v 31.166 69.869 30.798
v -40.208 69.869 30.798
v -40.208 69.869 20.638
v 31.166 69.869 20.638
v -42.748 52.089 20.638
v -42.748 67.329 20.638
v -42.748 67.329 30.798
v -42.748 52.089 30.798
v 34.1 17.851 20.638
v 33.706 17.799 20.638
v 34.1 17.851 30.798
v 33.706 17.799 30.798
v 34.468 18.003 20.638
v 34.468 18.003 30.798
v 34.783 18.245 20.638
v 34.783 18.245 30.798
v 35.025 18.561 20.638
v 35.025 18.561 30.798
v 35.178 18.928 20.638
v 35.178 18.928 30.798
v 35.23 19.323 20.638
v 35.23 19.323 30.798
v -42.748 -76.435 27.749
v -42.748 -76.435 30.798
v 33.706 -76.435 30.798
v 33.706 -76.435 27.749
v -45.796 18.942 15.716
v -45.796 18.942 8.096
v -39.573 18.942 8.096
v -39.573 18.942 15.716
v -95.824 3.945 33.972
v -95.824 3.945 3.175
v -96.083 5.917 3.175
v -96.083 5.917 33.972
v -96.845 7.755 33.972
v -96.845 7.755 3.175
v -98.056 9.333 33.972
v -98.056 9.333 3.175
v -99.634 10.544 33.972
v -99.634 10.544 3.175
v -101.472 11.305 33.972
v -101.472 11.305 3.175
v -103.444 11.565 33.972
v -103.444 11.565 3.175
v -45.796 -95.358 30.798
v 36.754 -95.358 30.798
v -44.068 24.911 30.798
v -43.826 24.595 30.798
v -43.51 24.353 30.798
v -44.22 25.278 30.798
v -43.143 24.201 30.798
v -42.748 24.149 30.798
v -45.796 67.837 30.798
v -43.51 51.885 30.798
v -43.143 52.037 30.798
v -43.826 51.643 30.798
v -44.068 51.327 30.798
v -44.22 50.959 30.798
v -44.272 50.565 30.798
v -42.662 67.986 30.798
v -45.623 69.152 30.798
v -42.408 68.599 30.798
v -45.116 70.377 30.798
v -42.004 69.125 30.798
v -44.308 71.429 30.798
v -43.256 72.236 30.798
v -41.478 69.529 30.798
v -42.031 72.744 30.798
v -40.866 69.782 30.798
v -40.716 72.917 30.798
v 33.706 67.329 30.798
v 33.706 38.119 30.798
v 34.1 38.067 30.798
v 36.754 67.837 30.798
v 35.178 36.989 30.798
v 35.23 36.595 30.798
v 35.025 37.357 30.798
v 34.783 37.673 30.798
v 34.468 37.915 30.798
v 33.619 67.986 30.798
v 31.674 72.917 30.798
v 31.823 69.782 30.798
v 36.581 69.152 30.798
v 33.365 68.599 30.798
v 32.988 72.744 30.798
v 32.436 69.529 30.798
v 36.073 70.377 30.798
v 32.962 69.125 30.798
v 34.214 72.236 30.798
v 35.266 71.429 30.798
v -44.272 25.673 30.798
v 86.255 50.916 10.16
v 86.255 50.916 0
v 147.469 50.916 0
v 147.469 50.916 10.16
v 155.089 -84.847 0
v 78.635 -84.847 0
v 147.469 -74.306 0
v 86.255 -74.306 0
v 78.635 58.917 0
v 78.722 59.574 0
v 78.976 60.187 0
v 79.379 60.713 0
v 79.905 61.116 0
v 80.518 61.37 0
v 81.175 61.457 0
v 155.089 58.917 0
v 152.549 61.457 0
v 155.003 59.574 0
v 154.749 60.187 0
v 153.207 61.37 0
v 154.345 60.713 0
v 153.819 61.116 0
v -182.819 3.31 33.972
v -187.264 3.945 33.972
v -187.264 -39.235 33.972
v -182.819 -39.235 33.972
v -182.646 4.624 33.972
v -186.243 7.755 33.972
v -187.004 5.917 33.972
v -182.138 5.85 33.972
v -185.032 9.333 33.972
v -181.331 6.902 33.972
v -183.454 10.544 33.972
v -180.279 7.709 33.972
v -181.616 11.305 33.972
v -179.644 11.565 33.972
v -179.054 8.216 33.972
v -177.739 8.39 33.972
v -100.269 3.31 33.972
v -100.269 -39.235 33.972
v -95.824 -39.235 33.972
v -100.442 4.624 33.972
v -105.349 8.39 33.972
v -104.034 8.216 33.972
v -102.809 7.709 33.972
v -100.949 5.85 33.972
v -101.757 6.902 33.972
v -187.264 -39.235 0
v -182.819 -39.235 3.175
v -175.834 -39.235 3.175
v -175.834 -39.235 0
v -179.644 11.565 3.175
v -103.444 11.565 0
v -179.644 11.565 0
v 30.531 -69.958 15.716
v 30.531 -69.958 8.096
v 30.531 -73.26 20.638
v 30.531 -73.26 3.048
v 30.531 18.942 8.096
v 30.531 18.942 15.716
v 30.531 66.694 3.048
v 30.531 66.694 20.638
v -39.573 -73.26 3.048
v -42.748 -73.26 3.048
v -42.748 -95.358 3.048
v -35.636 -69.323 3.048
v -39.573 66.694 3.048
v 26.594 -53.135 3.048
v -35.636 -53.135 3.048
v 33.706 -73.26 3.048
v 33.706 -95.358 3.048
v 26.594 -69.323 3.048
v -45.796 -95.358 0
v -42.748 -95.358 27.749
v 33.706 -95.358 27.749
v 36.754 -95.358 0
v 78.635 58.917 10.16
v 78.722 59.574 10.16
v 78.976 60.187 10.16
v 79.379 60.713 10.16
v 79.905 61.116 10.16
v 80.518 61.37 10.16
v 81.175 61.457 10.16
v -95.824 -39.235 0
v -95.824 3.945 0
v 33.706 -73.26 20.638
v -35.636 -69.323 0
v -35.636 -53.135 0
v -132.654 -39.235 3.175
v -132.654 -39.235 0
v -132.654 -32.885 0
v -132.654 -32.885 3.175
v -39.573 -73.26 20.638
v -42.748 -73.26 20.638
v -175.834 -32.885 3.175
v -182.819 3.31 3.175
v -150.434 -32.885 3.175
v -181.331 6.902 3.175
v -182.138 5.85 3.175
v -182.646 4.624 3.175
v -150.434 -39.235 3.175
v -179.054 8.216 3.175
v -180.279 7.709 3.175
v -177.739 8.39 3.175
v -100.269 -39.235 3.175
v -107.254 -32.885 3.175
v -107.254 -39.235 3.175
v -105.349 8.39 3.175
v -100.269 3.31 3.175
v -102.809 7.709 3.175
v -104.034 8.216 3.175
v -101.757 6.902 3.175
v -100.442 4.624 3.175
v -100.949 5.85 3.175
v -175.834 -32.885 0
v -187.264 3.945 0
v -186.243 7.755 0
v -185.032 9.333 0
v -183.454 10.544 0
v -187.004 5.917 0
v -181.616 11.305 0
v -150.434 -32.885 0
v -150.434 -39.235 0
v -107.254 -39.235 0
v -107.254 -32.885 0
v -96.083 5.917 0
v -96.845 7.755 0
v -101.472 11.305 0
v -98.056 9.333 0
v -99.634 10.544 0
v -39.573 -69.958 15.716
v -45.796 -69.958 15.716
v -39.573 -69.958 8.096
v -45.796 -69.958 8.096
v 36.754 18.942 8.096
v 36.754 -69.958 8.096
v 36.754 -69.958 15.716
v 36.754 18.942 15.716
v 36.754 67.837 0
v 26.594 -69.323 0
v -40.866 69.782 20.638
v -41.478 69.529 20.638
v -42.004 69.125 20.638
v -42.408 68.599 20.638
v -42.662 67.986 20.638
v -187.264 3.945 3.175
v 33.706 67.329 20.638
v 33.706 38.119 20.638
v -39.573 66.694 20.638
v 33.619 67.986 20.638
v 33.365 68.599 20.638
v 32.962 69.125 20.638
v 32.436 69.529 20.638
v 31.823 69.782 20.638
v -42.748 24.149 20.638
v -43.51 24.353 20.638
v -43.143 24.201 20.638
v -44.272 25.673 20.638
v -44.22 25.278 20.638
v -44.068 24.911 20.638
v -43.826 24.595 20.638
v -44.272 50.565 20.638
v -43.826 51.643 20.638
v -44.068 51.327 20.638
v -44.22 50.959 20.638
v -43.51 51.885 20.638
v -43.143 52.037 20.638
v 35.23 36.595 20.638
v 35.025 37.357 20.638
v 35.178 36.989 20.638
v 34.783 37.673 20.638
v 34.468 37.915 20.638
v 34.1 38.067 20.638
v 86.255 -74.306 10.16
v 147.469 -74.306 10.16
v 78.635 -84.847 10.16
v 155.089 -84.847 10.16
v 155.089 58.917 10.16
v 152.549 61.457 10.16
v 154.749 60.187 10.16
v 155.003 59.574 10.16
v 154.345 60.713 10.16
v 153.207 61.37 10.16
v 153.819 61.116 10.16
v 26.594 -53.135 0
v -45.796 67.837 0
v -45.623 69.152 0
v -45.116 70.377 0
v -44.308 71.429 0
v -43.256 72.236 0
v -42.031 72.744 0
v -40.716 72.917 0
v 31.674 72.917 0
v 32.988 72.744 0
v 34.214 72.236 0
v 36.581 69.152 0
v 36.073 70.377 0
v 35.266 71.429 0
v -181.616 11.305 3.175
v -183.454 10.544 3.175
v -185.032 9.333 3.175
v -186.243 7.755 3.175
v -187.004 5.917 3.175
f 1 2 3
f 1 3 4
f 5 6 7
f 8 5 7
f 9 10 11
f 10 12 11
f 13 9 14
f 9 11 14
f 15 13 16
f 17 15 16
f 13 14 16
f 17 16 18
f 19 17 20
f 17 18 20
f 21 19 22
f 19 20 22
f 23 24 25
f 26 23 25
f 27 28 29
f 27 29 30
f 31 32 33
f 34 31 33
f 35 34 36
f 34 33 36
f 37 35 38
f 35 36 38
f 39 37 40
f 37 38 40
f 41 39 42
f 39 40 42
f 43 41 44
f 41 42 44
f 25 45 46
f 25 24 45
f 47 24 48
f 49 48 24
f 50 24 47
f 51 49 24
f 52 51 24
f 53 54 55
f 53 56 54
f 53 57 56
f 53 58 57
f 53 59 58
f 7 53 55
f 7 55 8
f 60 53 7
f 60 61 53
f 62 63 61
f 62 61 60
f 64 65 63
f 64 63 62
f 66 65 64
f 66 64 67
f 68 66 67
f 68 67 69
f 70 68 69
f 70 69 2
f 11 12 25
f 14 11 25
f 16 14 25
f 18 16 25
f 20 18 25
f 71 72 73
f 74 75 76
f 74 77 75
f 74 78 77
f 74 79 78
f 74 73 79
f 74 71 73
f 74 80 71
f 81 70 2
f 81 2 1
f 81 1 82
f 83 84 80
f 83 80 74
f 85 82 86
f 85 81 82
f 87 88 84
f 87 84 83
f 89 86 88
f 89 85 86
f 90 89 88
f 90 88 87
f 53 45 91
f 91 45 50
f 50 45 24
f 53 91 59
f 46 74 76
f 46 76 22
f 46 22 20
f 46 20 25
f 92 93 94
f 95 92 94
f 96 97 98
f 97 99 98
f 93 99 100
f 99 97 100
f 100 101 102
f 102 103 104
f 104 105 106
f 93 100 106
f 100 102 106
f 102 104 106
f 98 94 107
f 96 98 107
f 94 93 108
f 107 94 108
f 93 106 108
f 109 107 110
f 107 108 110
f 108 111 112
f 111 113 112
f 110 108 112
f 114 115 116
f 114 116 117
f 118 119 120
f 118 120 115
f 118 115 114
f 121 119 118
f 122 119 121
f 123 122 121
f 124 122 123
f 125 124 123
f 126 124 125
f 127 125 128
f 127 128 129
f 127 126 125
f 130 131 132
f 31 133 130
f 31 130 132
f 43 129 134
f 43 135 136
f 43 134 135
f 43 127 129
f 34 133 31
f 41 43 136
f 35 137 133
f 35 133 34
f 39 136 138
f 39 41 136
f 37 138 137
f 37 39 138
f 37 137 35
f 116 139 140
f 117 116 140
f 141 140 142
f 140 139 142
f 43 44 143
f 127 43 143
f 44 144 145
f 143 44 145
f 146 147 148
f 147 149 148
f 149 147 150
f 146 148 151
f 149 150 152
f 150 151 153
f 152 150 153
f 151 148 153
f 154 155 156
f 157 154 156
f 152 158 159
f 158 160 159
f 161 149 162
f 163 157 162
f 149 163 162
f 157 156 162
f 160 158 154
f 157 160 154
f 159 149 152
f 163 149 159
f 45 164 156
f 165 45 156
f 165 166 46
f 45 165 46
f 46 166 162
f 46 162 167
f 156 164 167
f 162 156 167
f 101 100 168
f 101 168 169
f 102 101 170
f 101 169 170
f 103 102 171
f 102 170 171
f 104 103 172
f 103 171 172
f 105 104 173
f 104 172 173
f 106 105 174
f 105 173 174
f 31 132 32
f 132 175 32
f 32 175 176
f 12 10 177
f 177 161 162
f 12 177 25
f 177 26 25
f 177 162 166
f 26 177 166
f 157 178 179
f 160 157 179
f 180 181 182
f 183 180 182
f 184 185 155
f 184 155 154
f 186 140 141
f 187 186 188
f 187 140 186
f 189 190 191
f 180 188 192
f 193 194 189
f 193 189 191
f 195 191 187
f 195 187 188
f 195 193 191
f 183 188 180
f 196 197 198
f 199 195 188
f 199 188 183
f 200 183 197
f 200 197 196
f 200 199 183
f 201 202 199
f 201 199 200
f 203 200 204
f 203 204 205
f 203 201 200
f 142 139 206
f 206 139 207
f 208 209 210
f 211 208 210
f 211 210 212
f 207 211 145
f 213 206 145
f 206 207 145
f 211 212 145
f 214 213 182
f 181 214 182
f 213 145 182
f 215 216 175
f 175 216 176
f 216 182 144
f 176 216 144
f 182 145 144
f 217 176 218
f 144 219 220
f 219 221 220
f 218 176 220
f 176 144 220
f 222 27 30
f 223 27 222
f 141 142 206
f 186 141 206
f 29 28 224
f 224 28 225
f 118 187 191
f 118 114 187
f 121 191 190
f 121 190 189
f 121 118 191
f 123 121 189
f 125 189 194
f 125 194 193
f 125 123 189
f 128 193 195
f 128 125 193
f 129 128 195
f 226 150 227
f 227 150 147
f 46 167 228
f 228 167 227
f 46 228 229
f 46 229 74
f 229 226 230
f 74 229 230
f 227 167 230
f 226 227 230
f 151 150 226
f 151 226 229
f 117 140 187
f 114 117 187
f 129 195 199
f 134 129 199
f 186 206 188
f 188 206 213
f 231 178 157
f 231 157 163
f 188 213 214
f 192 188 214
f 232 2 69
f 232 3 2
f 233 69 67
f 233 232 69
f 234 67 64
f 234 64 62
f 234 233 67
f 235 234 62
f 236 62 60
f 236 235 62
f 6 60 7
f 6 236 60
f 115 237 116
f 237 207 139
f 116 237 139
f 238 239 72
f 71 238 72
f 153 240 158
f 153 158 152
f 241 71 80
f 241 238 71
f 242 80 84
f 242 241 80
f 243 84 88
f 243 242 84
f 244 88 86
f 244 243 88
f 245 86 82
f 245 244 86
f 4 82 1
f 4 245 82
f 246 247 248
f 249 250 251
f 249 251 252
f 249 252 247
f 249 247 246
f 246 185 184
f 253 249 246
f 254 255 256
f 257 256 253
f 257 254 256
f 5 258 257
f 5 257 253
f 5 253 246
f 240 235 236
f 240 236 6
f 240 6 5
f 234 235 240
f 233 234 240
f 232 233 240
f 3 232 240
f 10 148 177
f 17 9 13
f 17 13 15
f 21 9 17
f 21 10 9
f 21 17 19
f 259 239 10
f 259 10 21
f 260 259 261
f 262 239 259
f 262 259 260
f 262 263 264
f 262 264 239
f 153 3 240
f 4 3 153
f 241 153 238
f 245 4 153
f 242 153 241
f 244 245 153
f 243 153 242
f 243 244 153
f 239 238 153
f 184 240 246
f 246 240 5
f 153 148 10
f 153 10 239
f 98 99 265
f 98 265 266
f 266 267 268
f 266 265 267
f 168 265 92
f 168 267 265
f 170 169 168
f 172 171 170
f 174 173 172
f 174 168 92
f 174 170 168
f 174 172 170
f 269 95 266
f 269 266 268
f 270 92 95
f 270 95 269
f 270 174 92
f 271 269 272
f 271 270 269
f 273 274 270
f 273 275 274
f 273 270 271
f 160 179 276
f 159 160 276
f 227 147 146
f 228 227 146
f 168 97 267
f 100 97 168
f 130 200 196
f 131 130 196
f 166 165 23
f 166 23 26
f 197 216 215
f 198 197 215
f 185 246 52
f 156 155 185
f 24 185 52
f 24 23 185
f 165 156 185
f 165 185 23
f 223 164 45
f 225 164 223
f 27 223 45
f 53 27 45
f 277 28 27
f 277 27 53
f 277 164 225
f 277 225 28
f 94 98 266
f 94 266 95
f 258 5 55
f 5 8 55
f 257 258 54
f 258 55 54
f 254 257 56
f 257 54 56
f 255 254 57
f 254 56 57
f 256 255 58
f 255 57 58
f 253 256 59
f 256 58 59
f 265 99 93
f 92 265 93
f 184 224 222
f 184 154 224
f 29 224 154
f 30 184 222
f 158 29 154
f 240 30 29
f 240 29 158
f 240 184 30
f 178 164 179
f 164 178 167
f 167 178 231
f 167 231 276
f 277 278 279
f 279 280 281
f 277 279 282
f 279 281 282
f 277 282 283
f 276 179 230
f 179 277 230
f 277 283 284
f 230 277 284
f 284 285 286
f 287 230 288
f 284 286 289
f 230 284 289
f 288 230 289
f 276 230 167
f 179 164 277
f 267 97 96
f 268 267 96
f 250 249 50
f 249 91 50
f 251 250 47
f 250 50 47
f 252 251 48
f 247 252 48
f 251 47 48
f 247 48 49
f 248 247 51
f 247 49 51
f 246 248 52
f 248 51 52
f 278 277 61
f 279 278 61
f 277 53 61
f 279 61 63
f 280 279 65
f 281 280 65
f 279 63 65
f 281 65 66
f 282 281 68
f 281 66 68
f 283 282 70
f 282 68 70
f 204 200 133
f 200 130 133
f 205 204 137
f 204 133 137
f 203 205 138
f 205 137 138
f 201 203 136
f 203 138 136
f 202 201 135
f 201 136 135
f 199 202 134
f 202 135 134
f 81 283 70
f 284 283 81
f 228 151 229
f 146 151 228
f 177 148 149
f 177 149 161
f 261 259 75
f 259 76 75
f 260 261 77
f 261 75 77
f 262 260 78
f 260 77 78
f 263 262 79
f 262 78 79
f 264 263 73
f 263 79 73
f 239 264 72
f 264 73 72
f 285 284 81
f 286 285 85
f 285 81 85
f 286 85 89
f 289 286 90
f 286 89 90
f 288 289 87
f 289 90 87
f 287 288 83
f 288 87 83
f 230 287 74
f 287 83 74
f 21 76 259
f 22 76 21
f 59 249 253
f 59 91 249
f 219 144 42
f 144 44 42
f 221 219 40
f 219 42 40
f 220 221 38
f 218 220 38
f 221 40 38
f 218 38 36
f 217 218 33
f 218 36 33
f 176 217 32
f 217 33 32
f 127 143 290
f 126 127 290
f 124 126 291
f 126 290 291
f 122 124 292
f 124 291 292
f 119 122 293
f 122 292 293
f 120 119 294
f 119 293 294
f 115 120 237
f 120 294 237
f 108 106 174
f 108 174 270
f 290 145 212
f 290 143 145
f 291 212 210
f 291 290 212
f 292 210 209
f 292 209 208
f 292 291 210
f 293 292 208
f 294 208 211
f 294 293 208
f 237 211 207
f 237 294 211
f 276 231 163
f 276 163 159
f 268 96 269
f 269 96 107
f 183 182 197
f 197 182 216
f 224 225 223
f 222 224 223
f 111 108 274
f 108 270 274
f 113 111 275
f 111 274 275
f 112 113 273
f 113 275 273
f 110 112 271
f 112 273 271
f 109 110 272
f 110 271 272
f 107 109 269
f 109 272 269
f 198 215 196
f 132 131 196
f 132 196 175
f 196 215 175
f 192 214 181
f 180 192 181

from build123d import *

# Parameters (mm, degrees)
F0_W      = 82.55
F0_H      = 152.4
F0_W_2    = 62.23
F0_H_2    = 16.1877755683
F1_DEPTH  = 30.7975
F2_W      = 76.454
F2_H      = 146.304
F2_W_2    = 62.23
F2_H_2    = 16.1877755683
F3_DEPTH  = 10.16
F4_W      = 70.104
F4_H      = 139.954
F4_W_2    = 62.23
F4_H_2    = 16.1877755683
F5_DEPTH  = 17.5895
F0_H_3    = 15.875
F6_DEPTH  = 30.7975
F7_W      = 76.454
F7_H      = 24.7015
F8_DEPTH  = 22.098
F9_W      = 88.9
F9_H      = 7.62
F10_DEPTH = 82.55
F11_R     = 5.08
F12_W     = 27.94
F12_H     = 10.16
F13_DEPTH = 1.524
F14_R     = 1.52399
F15_W     = 20.32
F15_H     = 10.16
F16_DEPTH = 1.524
F17_R     = 1.52399
F18_R     = 2.54
F20_DEPTH = 3.175
F21_R     = 7.62
F23_DEPTH = 30.7975
F24_R     = 5.08
F25_W     = 76.454
F25_H     = 146.304
F25_W_2   = 61.214
F25_H_2   = 125.222
F26_DEPTH = 10.16
F27_R     = 2.54


# Not quite as in the source:
# - a fillet or chamfer is up to 0.001 mm smaller than in the source, because OpenCascade refuses the exact size


with BuildPart() as f1:
    # F0 (on Top) → F1 (new body)
    with BuildSketch(Plane.XY):
        with Locations((-4.5213731422, -3.2830588596)):
            Rectangle(F0_W, F0_H)
        with Locations((-4.5213731422, -61.2291710755)):
            Rectangle(F0_W_2, F0_H_2, mode=Mode.SUBTRACT)
    extrude(amount=F1_DEPTH)

    # F2 (on face) → F3 (cut)
    with BuildSketch(Plane.XY.offset(30.7975)):
        with Locations((-4.5213731422, -3.2830588596)):
            Rectangle(F2_W, F2_H)
        with Locations((-4.5213731422, -61.2291710755)):
            Rectangle(F2_W_2, F2_H_2, mode=Mode.SUBTRACT)
    extrude(amount=-F3_DEPTH, mode=Mode.SUBTRACT)

    # F4 (on face) → F5 (cut)
    with BuildSketch(Plane.XY.offset(20.6375)):
        with Locations((-4.5213731422, -3.2830588596)):
            Rectangle(F4_W, F4_H)
        with Locations((-4.5213731422, -61.2291710755)):
            Rectangle(F4_W_2, F4_H_2, mode=Mode.SUBTRACT)
    extrude(amount=-F5_DEPTH, mode=Mode.SUBTRACT)

    # F0 (on Top) → F6 (join)
    with BuildSketch(Plane.XY):
        with Locations((-4.5213731422, -87.4205588596)):
            Rectangle(F0_W, F0_H_3)
    extrude(amount=F6_DEPTH)

    # F7 (on face) → F8 (cut, through all)
    with BuildSketch(Plane.XZ.offset(95.3580588596)):
        with Locations((-4.5213731422, 15.39875)):
            Rectangle(F7_W, F7_H)
    extrude(amount=-F8_DEPTH, mode=Mode.SUBTRACT)

    # F9 (on face) → F10 (cut, through all)
    with BuildSketch(Plane(origin=(-45.7963731422, 0, 0), x_dir=(0, -1, 0), z_dir=(-1, 0, 0))):
        with Locations((25.5080588596, 11.90625)):
            Rectangle(F9_W, F9_H)
    extrude(amount=-F10_DEPTH, mode=Mode.SUBTRACT)

    # F11
    f11_edges = [f1.edges().sort_by_distance(p)[0] for p in [
        (-45.796373, 72.916941, 15.39875),
        (36.753627, 72.916941, 15.39875),
    ]]
    fillet(f11_edges, radius=F11_R)

    # F12 (on face) → F13 (cut)
    with BuildSketch(Plane.YZ.offset(-42.7483731422)):
        with Locations((38.1189411404, 25.7175)):
            Rectangle(F12_W, F12_H)
    extrude(amount=-F13_DEPTH, mode=Mode.SUBTRACT)

    # F14 (radius 1.524 in the source; OpenCascade refuses exactly that, so slightly less here)
    f14_edges = [f1.edges().sort_by_distance(p)[0] for p in [
        (-44.272373, 52.088941, 25.7175),
        (-44.272373, 24.148941, 25.7175),
    ]]
    fillet(f14_edges, radius=F14_R)

    # F15 (on face) → F16 (cut)
    with BuildSketch(Plane(origin=(33.7056268578, 0, 0), x_dir=(0, -1, 0), z_dir=(-1, 0, 0))):
        with Locations((-27.9589411404, 25.7175)):
            Rectangle(F15_W, F15_H)
    extrude(amount=-F16_DEPTH, mode=Mode.SUBTRACT)

    # F17 (radius 1.524 in the source; OpenCascade refuses exactly that, so slightly less here)
    f17_edges = [f1.edges().sort_by_distance(p)[0] for p in [
        (35.229627, 38.118941, 25.7175),
        (35.229627, 17.798941, 25.7175),
    ]]
    fillet(f17_edges, radius=F17_R)

    # F18
    f18_edges = [f1.edges().sort_by_distance(p)[0] for p in [
        (-42.748373, 69.868941, 25.7175),
        (33.705627, 69.868941, 25.7175),
    ]]
    fillet(f18_edges, radius=F18_R)


with BuildPart() as f20:
    # F19 (on Top) → F20 (new body)
    with BuildSketch(Plane.XY):
        Polygon((-95.8238354015, 11.5645605006), (-187.2638354015, 11.5645605006), (-187.2638354015, -39.2354394994), (-175.8338354015, -39.2354394994), (-175.8338354015, -32.8854394994), (-150.4338354015, -32.8854394994), (-150.4338354015, -39.2354394994), (-132.6538354015, -39.2354394994), (-132.6538354015, -32.8854394994), (-107.2538354015, -32.8854394994), (-107.2538354015, -39.2354394994), (-95.8238354015, -39.2354394994), align=None)
    extrude(amount=F20_DEPTH)

    # F21
    f21_edges = [f20.edges().sort_by_distance(p)[0] for p in [
        (-187.263835, 11.564561, 1.5875),
        (-95.823835, 11.564561, 1.5875),
    ]]
    fillet(f21_edges, radius=F21_R)

    # F22 (on face) → F23 (join)
    with BuildSketch(Plane.XY.offset(3.175)):
        with BuildLine():
            Line((-182.8188354015, -39.2354394994), (-182.8188354015, 8.3895605006))
            Line((-182.8188354015, 8.3895605006), (-100.2688354015, 8.3895605006))
            Line((-100.2688354015, 8.3895605006), (-100.2688354015, -39.2354394994))
            Line((-100.2688354015, -39.2354394994), (-95.8238354015, -39.2354394994))
            Line((-95.8238354015, -39.2354394994), (-95.8238354015, 3.9445605006))
            ThreePointArc((-95.8238354015, 3.9445605006), (-98.0556817289, 9.3327141732), (-103.4438354015, 11.5645605006))
            Line((-103.4438354015, 11.5645605006), (-179.6438354015, 11.5645605006))
            ThreePointArc((-179.6438354015, 11.5645605006), (-185.0319890742, 9.3327141732), (-187.2638354015, 3.9445605006))
            Line((-187.2638354015, 3.9445605006), (-187.2638354015, -39.2354394994))
            Line((-187.2638354015, -39.2354394994), (-182.8188354015, -39.2354394994))
        make_face()
    extrude(amount=F23_DEPTH)

    # F24
    f24_edges = [f20.edges().sort_by_distance(p)[0] for p in [
        (-182.818835, 8.389561, 18.57375),
        (-100.268835, 8.389561, 18.57375),
    ]]
    fillet(f24_edges, radius=F24_R)


with BuildPart() as f26:
    # F25 (on Top) → F26 (new body)
    with BuildSketch(Plane.XY):
        with Locations((116.8624450643, -11.695331095)):
            Rectangle(F25_W, F25_H)
        with Locations((116.8624450643, -11.695331095)):
            Rectangle(F25_W_2, F25_H_2, mode=Mode.SUBTRACT)
    extrude(amount=F26_DEPTH)

    # F27
    f27_edges = [f26.edges().sort_by_distance(p)[0] for p in [
        (78.635445, 61.456669, 5.08),
        (155.089445, 61.456669, 5.08),
    ]]
    fillet(f27_edges, radius=F27_R)


solid = Compound([f1.part, f20.part, f26.part])
